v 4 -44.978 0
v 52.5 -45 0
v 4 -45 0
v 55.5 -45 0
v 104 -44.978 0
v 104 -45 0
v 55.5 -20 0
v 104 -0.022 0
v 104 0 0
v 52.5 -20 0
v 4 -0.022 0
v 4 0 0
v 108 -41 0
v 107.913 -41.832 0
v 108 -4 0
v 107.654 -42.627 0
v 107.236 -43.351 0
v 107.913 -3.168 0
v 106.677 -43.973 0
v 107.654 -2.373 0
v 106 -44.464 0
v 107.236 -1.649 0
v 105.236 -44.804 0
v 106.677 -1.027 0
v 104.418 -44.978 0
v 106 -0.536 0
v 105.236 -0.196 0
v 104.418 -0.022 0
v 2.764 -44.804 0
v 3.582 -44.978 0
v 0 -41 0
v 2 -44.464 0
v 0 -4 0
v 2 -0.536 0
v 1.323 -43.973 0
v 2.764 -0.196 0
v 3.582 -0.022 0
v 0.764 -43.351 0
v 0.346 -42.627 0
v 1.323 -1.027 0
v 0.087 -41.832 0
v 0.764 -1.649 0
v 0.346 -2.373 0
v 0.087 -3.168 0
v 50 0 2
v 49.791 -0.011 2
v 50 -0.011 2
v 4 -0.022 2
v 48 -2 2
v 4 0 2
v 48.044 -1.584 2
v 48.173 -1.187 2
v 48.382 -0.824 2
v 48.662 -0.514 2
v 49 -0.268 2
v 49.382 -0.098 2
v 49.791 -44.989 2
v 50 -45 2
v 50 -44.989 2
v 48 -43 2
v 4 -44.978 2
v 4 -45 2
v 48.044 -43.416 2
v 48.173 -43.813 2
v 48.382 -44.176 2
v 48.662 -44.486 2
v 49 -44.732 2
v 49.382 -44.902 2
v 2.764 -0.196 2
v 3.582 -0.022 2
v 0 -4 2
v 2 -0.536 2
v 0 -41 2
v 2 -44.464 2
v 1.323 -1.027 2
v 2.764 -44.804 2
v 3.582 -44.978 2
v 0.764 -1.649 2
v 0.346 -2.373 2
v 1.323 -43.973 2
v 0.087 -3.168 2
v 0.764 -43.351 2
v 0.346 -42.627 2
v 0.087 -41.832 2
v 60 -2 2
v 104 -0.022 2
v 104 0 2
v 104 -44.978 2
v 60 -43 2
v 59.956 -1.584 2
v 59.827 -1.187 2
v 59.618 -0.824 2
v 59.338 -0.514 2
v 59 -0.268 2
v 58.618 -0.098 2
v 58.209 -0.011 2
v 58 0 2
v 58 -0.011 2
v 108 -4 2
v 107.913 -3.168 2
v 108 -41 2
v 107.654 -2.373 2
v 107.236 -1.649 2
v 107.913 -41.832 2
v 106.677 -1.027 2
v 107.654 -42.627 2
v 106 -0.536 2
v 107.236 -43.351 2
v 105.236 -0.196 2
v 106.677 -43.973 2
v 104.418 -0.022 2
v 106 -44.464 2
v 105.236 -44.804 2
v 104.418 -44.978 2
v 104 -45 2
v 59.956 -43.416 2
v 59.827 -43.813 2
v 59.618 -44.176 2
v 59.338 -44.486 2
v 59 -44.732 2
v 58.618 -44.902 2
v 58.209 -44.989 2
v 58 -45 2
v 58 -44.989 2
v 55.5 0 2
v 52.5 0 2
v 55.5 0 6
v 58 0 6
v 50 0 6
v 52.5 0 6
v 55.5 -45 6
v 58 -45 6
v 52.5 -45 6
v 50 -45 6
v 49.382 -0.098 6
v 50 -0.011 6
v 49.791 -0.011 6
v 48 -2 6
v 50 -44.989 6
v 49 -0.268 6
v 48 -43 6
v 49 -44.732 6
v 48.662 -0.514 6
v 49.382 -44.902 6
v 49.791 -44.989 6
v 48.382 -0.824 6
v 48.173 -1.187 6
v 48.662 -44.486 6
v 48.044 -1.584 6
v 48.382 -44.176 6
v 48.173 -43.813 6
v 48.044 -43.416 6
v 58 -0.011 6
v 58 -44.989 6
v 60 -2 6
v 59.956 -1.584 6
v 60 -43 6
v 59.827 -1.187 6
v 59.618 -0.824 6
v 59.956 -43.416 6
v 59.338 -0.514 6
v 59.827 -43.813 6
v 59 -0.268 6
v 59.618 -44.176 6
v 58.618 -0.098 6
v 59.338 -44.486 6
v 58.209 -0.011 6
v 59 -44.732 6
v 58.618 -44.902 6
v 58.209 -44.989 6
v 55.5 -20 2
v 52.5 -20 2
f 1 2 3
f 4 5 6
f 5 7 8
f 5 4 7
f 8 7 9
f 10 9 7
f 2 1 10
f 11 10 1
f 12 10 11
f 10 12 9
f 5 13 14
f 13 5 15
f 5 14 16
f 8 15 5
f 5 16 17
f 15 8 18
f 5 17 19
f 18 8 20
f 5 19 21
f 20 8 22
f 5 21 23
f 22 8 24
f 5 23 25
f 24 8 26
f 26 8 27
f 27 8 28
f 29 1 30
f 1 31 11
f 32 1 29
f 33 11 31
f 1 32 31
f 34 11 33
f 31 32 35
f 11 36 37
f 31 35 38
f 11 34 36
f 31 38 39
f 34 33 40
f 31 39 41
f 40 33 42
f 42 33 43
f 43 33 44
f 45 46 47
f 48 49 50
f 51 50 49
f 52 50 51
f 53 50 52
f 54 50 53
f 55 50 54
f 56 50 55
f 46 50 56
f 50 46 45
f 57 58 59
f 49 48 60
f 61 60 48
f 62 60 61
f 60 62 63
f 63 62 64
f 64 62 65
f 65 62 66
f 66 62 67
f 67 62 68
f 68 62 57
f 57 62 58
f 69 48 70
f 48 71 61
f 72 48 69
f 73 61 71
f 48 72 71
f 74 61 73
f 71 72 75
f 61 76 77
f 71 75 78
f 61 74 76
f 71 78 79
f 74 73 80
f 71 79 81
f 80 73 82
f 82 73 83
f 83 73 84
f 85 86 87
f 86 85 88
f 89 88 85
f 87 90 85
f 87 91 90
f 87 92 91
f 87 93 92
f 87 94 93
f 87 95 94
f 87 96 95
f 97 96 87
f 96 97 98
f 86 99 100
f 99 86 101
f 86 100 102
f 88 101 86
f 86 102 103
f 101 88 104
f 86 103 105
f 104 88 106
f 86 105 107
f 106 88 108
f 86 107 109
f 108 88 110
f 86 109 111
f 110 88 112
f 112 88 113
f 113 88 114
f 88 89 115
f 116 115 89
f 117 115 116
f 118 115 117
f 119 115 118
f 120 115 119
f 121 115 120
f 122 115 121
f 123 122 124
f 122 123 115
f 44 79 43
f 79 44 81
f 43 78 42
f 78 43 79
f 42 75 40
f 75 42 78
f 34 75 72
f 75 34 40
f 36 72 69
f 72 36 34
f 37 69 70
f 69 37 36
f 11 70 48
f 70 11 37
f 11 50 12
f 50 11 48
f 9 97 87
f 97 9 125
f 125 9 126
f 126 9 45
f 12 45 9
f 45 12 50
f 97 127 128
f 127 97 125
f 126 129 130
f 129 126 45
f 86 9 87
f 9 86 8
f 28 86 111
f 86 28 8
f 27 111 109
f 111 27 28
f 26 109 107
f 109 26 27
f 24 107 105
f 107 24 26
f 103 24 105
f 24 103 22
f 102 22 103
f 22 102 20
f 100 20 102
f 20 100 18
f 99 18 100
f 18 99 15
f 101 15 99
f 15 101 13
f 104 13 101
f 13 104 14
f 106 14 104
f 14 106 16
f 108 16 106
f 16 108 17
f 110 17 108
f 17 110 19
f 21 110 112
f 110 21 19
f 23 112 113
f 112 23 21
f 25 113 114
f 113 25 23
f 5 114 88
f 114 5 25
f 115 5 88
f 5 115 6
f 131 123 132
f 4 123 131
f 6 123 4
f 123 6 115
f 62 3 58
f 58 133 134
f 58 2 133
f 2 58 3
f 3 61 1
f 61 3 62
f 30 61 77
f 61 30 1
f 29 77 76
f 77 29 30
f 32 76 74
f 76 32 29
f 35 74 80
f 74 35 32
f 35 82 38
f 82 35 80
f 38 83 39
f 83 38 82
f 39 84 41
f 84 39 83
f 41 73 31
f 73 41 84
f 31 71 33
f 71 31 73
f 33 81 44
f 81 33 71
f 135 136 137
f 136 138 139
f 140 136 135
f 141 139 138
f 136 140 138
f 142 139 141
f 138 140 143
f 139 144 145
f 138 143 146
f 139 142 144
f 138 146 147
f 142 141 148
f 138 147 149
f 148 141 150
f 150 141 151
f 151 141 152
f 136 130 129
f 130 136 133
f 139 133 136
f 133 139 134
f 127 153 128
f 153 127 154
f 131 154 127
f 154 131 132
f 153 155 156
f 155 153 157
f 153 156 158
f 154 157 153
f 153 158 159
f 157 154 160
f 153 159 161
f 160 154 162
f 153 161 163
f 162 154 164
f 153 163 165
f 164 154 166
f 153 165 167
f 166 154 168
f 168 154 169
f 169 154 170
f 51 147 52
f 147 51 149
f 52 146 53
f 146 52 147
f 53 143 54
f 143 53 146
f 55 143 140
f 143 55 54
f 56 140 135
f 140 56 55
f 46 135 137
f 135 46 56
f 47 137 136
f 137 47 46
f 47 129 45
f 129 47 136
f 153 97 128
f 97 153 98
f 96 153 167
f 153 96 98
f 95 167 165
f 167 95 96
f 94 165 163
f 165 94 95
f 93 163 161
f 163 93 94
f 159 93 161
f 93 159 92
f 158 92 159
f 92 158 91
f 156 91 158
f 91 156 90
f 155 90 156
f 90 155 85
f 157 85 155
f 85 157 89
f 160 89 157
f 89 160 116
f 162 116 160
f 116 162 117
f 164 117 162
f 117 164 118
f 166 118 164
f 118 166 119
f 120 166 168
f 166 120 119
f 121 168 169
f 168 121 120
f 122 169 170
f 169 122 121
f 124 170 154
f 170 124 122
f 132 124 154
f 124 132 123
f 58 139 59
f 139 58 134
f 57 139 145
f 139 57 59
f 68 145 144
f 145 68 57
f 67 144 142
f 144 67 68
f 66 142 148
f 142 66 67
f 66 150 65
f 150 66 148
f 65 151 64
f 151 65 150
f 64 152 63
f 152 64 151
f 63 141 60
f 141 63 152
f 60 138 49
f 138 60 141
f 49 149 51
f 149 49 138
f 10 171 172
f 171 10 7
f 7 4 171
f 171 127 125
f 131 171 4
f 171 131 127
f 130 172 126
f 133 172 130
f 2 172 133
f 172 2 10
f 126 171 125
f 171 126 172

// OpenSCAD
mirror([0,0,1]) rotate([90,90,0])
difference(){
  union(){
    rotate([90,0,90]) {
    rounded_cube([108,45,2],rsides=4,rvert=0);
    translate([48,0,0]) rounded_cube([12,45,6]);
    }
  }
  translate([-.01,52.5,20])
    cube([6.02,3,25.01]);
  translate([2,52.5,-.01])
    cube([4.02,3,45.02]);
}
//translate([-67.6,53]) 
*translate([-15,10])
rotate([-90,0])
difference(){
  rotate([-90,-90,0]) rounded_cube([45,135,2],rsides=4);
  translate([67,-.01,-.01])
    cube([3,2.02,25]);
}

module box(size,r=1,top=1,bottom=1,left=1,right=1,front=1,back=1)
{
  w=size[0];
  d=size[1];
  h=size[2];
  intersection(){
    cube([w,d,h]);
    minkowski(){
      translate([left?r:0,front?r:0,bottom?r:0]) cube([w-(left?r:0)-(right?r:0),d-(front?r:0)-(back?r:0),h-(top?r:0)-(bottom?r:0)]);
      sphere(r,$fn=30);
    }
  }
}
module rounded_rect(w,h,r) {
  translate([r,r]) circle(d=r*2,$fn=30);
  translate([r,h-r]) circle(d=r*2,$fn=30);
  translate([w-r,h-r]) circle(d=r*2,$fn=30);
  translate([w-r,r]) circle(d=r*2,$fn=30);
  translate([r,0]) square([w-r*2,h]);
  translate([0,r]) square([r,h-r*2]);
  translate([w-r,r]) square([r,h-r*2]);
}
module rounded_cube(dims,rsides=2,rvert=0)
{
  w=dims[0];
  h=dims[1];
  d=dims[2];
  if(rvert==0)
  {
    linear_extrude(d) rounded_rect(w,h,rsides);
  } else {
    translate([rsides,rsides,rvert]) scale([1,1,rvert/rsides]) minkowski() {
      cube([w-rsides*2,h-rsides*2,(d-rvert*2)/(rvert/rsides)]);
      sphere(rsides,$fn=30);
    }
  }
}
